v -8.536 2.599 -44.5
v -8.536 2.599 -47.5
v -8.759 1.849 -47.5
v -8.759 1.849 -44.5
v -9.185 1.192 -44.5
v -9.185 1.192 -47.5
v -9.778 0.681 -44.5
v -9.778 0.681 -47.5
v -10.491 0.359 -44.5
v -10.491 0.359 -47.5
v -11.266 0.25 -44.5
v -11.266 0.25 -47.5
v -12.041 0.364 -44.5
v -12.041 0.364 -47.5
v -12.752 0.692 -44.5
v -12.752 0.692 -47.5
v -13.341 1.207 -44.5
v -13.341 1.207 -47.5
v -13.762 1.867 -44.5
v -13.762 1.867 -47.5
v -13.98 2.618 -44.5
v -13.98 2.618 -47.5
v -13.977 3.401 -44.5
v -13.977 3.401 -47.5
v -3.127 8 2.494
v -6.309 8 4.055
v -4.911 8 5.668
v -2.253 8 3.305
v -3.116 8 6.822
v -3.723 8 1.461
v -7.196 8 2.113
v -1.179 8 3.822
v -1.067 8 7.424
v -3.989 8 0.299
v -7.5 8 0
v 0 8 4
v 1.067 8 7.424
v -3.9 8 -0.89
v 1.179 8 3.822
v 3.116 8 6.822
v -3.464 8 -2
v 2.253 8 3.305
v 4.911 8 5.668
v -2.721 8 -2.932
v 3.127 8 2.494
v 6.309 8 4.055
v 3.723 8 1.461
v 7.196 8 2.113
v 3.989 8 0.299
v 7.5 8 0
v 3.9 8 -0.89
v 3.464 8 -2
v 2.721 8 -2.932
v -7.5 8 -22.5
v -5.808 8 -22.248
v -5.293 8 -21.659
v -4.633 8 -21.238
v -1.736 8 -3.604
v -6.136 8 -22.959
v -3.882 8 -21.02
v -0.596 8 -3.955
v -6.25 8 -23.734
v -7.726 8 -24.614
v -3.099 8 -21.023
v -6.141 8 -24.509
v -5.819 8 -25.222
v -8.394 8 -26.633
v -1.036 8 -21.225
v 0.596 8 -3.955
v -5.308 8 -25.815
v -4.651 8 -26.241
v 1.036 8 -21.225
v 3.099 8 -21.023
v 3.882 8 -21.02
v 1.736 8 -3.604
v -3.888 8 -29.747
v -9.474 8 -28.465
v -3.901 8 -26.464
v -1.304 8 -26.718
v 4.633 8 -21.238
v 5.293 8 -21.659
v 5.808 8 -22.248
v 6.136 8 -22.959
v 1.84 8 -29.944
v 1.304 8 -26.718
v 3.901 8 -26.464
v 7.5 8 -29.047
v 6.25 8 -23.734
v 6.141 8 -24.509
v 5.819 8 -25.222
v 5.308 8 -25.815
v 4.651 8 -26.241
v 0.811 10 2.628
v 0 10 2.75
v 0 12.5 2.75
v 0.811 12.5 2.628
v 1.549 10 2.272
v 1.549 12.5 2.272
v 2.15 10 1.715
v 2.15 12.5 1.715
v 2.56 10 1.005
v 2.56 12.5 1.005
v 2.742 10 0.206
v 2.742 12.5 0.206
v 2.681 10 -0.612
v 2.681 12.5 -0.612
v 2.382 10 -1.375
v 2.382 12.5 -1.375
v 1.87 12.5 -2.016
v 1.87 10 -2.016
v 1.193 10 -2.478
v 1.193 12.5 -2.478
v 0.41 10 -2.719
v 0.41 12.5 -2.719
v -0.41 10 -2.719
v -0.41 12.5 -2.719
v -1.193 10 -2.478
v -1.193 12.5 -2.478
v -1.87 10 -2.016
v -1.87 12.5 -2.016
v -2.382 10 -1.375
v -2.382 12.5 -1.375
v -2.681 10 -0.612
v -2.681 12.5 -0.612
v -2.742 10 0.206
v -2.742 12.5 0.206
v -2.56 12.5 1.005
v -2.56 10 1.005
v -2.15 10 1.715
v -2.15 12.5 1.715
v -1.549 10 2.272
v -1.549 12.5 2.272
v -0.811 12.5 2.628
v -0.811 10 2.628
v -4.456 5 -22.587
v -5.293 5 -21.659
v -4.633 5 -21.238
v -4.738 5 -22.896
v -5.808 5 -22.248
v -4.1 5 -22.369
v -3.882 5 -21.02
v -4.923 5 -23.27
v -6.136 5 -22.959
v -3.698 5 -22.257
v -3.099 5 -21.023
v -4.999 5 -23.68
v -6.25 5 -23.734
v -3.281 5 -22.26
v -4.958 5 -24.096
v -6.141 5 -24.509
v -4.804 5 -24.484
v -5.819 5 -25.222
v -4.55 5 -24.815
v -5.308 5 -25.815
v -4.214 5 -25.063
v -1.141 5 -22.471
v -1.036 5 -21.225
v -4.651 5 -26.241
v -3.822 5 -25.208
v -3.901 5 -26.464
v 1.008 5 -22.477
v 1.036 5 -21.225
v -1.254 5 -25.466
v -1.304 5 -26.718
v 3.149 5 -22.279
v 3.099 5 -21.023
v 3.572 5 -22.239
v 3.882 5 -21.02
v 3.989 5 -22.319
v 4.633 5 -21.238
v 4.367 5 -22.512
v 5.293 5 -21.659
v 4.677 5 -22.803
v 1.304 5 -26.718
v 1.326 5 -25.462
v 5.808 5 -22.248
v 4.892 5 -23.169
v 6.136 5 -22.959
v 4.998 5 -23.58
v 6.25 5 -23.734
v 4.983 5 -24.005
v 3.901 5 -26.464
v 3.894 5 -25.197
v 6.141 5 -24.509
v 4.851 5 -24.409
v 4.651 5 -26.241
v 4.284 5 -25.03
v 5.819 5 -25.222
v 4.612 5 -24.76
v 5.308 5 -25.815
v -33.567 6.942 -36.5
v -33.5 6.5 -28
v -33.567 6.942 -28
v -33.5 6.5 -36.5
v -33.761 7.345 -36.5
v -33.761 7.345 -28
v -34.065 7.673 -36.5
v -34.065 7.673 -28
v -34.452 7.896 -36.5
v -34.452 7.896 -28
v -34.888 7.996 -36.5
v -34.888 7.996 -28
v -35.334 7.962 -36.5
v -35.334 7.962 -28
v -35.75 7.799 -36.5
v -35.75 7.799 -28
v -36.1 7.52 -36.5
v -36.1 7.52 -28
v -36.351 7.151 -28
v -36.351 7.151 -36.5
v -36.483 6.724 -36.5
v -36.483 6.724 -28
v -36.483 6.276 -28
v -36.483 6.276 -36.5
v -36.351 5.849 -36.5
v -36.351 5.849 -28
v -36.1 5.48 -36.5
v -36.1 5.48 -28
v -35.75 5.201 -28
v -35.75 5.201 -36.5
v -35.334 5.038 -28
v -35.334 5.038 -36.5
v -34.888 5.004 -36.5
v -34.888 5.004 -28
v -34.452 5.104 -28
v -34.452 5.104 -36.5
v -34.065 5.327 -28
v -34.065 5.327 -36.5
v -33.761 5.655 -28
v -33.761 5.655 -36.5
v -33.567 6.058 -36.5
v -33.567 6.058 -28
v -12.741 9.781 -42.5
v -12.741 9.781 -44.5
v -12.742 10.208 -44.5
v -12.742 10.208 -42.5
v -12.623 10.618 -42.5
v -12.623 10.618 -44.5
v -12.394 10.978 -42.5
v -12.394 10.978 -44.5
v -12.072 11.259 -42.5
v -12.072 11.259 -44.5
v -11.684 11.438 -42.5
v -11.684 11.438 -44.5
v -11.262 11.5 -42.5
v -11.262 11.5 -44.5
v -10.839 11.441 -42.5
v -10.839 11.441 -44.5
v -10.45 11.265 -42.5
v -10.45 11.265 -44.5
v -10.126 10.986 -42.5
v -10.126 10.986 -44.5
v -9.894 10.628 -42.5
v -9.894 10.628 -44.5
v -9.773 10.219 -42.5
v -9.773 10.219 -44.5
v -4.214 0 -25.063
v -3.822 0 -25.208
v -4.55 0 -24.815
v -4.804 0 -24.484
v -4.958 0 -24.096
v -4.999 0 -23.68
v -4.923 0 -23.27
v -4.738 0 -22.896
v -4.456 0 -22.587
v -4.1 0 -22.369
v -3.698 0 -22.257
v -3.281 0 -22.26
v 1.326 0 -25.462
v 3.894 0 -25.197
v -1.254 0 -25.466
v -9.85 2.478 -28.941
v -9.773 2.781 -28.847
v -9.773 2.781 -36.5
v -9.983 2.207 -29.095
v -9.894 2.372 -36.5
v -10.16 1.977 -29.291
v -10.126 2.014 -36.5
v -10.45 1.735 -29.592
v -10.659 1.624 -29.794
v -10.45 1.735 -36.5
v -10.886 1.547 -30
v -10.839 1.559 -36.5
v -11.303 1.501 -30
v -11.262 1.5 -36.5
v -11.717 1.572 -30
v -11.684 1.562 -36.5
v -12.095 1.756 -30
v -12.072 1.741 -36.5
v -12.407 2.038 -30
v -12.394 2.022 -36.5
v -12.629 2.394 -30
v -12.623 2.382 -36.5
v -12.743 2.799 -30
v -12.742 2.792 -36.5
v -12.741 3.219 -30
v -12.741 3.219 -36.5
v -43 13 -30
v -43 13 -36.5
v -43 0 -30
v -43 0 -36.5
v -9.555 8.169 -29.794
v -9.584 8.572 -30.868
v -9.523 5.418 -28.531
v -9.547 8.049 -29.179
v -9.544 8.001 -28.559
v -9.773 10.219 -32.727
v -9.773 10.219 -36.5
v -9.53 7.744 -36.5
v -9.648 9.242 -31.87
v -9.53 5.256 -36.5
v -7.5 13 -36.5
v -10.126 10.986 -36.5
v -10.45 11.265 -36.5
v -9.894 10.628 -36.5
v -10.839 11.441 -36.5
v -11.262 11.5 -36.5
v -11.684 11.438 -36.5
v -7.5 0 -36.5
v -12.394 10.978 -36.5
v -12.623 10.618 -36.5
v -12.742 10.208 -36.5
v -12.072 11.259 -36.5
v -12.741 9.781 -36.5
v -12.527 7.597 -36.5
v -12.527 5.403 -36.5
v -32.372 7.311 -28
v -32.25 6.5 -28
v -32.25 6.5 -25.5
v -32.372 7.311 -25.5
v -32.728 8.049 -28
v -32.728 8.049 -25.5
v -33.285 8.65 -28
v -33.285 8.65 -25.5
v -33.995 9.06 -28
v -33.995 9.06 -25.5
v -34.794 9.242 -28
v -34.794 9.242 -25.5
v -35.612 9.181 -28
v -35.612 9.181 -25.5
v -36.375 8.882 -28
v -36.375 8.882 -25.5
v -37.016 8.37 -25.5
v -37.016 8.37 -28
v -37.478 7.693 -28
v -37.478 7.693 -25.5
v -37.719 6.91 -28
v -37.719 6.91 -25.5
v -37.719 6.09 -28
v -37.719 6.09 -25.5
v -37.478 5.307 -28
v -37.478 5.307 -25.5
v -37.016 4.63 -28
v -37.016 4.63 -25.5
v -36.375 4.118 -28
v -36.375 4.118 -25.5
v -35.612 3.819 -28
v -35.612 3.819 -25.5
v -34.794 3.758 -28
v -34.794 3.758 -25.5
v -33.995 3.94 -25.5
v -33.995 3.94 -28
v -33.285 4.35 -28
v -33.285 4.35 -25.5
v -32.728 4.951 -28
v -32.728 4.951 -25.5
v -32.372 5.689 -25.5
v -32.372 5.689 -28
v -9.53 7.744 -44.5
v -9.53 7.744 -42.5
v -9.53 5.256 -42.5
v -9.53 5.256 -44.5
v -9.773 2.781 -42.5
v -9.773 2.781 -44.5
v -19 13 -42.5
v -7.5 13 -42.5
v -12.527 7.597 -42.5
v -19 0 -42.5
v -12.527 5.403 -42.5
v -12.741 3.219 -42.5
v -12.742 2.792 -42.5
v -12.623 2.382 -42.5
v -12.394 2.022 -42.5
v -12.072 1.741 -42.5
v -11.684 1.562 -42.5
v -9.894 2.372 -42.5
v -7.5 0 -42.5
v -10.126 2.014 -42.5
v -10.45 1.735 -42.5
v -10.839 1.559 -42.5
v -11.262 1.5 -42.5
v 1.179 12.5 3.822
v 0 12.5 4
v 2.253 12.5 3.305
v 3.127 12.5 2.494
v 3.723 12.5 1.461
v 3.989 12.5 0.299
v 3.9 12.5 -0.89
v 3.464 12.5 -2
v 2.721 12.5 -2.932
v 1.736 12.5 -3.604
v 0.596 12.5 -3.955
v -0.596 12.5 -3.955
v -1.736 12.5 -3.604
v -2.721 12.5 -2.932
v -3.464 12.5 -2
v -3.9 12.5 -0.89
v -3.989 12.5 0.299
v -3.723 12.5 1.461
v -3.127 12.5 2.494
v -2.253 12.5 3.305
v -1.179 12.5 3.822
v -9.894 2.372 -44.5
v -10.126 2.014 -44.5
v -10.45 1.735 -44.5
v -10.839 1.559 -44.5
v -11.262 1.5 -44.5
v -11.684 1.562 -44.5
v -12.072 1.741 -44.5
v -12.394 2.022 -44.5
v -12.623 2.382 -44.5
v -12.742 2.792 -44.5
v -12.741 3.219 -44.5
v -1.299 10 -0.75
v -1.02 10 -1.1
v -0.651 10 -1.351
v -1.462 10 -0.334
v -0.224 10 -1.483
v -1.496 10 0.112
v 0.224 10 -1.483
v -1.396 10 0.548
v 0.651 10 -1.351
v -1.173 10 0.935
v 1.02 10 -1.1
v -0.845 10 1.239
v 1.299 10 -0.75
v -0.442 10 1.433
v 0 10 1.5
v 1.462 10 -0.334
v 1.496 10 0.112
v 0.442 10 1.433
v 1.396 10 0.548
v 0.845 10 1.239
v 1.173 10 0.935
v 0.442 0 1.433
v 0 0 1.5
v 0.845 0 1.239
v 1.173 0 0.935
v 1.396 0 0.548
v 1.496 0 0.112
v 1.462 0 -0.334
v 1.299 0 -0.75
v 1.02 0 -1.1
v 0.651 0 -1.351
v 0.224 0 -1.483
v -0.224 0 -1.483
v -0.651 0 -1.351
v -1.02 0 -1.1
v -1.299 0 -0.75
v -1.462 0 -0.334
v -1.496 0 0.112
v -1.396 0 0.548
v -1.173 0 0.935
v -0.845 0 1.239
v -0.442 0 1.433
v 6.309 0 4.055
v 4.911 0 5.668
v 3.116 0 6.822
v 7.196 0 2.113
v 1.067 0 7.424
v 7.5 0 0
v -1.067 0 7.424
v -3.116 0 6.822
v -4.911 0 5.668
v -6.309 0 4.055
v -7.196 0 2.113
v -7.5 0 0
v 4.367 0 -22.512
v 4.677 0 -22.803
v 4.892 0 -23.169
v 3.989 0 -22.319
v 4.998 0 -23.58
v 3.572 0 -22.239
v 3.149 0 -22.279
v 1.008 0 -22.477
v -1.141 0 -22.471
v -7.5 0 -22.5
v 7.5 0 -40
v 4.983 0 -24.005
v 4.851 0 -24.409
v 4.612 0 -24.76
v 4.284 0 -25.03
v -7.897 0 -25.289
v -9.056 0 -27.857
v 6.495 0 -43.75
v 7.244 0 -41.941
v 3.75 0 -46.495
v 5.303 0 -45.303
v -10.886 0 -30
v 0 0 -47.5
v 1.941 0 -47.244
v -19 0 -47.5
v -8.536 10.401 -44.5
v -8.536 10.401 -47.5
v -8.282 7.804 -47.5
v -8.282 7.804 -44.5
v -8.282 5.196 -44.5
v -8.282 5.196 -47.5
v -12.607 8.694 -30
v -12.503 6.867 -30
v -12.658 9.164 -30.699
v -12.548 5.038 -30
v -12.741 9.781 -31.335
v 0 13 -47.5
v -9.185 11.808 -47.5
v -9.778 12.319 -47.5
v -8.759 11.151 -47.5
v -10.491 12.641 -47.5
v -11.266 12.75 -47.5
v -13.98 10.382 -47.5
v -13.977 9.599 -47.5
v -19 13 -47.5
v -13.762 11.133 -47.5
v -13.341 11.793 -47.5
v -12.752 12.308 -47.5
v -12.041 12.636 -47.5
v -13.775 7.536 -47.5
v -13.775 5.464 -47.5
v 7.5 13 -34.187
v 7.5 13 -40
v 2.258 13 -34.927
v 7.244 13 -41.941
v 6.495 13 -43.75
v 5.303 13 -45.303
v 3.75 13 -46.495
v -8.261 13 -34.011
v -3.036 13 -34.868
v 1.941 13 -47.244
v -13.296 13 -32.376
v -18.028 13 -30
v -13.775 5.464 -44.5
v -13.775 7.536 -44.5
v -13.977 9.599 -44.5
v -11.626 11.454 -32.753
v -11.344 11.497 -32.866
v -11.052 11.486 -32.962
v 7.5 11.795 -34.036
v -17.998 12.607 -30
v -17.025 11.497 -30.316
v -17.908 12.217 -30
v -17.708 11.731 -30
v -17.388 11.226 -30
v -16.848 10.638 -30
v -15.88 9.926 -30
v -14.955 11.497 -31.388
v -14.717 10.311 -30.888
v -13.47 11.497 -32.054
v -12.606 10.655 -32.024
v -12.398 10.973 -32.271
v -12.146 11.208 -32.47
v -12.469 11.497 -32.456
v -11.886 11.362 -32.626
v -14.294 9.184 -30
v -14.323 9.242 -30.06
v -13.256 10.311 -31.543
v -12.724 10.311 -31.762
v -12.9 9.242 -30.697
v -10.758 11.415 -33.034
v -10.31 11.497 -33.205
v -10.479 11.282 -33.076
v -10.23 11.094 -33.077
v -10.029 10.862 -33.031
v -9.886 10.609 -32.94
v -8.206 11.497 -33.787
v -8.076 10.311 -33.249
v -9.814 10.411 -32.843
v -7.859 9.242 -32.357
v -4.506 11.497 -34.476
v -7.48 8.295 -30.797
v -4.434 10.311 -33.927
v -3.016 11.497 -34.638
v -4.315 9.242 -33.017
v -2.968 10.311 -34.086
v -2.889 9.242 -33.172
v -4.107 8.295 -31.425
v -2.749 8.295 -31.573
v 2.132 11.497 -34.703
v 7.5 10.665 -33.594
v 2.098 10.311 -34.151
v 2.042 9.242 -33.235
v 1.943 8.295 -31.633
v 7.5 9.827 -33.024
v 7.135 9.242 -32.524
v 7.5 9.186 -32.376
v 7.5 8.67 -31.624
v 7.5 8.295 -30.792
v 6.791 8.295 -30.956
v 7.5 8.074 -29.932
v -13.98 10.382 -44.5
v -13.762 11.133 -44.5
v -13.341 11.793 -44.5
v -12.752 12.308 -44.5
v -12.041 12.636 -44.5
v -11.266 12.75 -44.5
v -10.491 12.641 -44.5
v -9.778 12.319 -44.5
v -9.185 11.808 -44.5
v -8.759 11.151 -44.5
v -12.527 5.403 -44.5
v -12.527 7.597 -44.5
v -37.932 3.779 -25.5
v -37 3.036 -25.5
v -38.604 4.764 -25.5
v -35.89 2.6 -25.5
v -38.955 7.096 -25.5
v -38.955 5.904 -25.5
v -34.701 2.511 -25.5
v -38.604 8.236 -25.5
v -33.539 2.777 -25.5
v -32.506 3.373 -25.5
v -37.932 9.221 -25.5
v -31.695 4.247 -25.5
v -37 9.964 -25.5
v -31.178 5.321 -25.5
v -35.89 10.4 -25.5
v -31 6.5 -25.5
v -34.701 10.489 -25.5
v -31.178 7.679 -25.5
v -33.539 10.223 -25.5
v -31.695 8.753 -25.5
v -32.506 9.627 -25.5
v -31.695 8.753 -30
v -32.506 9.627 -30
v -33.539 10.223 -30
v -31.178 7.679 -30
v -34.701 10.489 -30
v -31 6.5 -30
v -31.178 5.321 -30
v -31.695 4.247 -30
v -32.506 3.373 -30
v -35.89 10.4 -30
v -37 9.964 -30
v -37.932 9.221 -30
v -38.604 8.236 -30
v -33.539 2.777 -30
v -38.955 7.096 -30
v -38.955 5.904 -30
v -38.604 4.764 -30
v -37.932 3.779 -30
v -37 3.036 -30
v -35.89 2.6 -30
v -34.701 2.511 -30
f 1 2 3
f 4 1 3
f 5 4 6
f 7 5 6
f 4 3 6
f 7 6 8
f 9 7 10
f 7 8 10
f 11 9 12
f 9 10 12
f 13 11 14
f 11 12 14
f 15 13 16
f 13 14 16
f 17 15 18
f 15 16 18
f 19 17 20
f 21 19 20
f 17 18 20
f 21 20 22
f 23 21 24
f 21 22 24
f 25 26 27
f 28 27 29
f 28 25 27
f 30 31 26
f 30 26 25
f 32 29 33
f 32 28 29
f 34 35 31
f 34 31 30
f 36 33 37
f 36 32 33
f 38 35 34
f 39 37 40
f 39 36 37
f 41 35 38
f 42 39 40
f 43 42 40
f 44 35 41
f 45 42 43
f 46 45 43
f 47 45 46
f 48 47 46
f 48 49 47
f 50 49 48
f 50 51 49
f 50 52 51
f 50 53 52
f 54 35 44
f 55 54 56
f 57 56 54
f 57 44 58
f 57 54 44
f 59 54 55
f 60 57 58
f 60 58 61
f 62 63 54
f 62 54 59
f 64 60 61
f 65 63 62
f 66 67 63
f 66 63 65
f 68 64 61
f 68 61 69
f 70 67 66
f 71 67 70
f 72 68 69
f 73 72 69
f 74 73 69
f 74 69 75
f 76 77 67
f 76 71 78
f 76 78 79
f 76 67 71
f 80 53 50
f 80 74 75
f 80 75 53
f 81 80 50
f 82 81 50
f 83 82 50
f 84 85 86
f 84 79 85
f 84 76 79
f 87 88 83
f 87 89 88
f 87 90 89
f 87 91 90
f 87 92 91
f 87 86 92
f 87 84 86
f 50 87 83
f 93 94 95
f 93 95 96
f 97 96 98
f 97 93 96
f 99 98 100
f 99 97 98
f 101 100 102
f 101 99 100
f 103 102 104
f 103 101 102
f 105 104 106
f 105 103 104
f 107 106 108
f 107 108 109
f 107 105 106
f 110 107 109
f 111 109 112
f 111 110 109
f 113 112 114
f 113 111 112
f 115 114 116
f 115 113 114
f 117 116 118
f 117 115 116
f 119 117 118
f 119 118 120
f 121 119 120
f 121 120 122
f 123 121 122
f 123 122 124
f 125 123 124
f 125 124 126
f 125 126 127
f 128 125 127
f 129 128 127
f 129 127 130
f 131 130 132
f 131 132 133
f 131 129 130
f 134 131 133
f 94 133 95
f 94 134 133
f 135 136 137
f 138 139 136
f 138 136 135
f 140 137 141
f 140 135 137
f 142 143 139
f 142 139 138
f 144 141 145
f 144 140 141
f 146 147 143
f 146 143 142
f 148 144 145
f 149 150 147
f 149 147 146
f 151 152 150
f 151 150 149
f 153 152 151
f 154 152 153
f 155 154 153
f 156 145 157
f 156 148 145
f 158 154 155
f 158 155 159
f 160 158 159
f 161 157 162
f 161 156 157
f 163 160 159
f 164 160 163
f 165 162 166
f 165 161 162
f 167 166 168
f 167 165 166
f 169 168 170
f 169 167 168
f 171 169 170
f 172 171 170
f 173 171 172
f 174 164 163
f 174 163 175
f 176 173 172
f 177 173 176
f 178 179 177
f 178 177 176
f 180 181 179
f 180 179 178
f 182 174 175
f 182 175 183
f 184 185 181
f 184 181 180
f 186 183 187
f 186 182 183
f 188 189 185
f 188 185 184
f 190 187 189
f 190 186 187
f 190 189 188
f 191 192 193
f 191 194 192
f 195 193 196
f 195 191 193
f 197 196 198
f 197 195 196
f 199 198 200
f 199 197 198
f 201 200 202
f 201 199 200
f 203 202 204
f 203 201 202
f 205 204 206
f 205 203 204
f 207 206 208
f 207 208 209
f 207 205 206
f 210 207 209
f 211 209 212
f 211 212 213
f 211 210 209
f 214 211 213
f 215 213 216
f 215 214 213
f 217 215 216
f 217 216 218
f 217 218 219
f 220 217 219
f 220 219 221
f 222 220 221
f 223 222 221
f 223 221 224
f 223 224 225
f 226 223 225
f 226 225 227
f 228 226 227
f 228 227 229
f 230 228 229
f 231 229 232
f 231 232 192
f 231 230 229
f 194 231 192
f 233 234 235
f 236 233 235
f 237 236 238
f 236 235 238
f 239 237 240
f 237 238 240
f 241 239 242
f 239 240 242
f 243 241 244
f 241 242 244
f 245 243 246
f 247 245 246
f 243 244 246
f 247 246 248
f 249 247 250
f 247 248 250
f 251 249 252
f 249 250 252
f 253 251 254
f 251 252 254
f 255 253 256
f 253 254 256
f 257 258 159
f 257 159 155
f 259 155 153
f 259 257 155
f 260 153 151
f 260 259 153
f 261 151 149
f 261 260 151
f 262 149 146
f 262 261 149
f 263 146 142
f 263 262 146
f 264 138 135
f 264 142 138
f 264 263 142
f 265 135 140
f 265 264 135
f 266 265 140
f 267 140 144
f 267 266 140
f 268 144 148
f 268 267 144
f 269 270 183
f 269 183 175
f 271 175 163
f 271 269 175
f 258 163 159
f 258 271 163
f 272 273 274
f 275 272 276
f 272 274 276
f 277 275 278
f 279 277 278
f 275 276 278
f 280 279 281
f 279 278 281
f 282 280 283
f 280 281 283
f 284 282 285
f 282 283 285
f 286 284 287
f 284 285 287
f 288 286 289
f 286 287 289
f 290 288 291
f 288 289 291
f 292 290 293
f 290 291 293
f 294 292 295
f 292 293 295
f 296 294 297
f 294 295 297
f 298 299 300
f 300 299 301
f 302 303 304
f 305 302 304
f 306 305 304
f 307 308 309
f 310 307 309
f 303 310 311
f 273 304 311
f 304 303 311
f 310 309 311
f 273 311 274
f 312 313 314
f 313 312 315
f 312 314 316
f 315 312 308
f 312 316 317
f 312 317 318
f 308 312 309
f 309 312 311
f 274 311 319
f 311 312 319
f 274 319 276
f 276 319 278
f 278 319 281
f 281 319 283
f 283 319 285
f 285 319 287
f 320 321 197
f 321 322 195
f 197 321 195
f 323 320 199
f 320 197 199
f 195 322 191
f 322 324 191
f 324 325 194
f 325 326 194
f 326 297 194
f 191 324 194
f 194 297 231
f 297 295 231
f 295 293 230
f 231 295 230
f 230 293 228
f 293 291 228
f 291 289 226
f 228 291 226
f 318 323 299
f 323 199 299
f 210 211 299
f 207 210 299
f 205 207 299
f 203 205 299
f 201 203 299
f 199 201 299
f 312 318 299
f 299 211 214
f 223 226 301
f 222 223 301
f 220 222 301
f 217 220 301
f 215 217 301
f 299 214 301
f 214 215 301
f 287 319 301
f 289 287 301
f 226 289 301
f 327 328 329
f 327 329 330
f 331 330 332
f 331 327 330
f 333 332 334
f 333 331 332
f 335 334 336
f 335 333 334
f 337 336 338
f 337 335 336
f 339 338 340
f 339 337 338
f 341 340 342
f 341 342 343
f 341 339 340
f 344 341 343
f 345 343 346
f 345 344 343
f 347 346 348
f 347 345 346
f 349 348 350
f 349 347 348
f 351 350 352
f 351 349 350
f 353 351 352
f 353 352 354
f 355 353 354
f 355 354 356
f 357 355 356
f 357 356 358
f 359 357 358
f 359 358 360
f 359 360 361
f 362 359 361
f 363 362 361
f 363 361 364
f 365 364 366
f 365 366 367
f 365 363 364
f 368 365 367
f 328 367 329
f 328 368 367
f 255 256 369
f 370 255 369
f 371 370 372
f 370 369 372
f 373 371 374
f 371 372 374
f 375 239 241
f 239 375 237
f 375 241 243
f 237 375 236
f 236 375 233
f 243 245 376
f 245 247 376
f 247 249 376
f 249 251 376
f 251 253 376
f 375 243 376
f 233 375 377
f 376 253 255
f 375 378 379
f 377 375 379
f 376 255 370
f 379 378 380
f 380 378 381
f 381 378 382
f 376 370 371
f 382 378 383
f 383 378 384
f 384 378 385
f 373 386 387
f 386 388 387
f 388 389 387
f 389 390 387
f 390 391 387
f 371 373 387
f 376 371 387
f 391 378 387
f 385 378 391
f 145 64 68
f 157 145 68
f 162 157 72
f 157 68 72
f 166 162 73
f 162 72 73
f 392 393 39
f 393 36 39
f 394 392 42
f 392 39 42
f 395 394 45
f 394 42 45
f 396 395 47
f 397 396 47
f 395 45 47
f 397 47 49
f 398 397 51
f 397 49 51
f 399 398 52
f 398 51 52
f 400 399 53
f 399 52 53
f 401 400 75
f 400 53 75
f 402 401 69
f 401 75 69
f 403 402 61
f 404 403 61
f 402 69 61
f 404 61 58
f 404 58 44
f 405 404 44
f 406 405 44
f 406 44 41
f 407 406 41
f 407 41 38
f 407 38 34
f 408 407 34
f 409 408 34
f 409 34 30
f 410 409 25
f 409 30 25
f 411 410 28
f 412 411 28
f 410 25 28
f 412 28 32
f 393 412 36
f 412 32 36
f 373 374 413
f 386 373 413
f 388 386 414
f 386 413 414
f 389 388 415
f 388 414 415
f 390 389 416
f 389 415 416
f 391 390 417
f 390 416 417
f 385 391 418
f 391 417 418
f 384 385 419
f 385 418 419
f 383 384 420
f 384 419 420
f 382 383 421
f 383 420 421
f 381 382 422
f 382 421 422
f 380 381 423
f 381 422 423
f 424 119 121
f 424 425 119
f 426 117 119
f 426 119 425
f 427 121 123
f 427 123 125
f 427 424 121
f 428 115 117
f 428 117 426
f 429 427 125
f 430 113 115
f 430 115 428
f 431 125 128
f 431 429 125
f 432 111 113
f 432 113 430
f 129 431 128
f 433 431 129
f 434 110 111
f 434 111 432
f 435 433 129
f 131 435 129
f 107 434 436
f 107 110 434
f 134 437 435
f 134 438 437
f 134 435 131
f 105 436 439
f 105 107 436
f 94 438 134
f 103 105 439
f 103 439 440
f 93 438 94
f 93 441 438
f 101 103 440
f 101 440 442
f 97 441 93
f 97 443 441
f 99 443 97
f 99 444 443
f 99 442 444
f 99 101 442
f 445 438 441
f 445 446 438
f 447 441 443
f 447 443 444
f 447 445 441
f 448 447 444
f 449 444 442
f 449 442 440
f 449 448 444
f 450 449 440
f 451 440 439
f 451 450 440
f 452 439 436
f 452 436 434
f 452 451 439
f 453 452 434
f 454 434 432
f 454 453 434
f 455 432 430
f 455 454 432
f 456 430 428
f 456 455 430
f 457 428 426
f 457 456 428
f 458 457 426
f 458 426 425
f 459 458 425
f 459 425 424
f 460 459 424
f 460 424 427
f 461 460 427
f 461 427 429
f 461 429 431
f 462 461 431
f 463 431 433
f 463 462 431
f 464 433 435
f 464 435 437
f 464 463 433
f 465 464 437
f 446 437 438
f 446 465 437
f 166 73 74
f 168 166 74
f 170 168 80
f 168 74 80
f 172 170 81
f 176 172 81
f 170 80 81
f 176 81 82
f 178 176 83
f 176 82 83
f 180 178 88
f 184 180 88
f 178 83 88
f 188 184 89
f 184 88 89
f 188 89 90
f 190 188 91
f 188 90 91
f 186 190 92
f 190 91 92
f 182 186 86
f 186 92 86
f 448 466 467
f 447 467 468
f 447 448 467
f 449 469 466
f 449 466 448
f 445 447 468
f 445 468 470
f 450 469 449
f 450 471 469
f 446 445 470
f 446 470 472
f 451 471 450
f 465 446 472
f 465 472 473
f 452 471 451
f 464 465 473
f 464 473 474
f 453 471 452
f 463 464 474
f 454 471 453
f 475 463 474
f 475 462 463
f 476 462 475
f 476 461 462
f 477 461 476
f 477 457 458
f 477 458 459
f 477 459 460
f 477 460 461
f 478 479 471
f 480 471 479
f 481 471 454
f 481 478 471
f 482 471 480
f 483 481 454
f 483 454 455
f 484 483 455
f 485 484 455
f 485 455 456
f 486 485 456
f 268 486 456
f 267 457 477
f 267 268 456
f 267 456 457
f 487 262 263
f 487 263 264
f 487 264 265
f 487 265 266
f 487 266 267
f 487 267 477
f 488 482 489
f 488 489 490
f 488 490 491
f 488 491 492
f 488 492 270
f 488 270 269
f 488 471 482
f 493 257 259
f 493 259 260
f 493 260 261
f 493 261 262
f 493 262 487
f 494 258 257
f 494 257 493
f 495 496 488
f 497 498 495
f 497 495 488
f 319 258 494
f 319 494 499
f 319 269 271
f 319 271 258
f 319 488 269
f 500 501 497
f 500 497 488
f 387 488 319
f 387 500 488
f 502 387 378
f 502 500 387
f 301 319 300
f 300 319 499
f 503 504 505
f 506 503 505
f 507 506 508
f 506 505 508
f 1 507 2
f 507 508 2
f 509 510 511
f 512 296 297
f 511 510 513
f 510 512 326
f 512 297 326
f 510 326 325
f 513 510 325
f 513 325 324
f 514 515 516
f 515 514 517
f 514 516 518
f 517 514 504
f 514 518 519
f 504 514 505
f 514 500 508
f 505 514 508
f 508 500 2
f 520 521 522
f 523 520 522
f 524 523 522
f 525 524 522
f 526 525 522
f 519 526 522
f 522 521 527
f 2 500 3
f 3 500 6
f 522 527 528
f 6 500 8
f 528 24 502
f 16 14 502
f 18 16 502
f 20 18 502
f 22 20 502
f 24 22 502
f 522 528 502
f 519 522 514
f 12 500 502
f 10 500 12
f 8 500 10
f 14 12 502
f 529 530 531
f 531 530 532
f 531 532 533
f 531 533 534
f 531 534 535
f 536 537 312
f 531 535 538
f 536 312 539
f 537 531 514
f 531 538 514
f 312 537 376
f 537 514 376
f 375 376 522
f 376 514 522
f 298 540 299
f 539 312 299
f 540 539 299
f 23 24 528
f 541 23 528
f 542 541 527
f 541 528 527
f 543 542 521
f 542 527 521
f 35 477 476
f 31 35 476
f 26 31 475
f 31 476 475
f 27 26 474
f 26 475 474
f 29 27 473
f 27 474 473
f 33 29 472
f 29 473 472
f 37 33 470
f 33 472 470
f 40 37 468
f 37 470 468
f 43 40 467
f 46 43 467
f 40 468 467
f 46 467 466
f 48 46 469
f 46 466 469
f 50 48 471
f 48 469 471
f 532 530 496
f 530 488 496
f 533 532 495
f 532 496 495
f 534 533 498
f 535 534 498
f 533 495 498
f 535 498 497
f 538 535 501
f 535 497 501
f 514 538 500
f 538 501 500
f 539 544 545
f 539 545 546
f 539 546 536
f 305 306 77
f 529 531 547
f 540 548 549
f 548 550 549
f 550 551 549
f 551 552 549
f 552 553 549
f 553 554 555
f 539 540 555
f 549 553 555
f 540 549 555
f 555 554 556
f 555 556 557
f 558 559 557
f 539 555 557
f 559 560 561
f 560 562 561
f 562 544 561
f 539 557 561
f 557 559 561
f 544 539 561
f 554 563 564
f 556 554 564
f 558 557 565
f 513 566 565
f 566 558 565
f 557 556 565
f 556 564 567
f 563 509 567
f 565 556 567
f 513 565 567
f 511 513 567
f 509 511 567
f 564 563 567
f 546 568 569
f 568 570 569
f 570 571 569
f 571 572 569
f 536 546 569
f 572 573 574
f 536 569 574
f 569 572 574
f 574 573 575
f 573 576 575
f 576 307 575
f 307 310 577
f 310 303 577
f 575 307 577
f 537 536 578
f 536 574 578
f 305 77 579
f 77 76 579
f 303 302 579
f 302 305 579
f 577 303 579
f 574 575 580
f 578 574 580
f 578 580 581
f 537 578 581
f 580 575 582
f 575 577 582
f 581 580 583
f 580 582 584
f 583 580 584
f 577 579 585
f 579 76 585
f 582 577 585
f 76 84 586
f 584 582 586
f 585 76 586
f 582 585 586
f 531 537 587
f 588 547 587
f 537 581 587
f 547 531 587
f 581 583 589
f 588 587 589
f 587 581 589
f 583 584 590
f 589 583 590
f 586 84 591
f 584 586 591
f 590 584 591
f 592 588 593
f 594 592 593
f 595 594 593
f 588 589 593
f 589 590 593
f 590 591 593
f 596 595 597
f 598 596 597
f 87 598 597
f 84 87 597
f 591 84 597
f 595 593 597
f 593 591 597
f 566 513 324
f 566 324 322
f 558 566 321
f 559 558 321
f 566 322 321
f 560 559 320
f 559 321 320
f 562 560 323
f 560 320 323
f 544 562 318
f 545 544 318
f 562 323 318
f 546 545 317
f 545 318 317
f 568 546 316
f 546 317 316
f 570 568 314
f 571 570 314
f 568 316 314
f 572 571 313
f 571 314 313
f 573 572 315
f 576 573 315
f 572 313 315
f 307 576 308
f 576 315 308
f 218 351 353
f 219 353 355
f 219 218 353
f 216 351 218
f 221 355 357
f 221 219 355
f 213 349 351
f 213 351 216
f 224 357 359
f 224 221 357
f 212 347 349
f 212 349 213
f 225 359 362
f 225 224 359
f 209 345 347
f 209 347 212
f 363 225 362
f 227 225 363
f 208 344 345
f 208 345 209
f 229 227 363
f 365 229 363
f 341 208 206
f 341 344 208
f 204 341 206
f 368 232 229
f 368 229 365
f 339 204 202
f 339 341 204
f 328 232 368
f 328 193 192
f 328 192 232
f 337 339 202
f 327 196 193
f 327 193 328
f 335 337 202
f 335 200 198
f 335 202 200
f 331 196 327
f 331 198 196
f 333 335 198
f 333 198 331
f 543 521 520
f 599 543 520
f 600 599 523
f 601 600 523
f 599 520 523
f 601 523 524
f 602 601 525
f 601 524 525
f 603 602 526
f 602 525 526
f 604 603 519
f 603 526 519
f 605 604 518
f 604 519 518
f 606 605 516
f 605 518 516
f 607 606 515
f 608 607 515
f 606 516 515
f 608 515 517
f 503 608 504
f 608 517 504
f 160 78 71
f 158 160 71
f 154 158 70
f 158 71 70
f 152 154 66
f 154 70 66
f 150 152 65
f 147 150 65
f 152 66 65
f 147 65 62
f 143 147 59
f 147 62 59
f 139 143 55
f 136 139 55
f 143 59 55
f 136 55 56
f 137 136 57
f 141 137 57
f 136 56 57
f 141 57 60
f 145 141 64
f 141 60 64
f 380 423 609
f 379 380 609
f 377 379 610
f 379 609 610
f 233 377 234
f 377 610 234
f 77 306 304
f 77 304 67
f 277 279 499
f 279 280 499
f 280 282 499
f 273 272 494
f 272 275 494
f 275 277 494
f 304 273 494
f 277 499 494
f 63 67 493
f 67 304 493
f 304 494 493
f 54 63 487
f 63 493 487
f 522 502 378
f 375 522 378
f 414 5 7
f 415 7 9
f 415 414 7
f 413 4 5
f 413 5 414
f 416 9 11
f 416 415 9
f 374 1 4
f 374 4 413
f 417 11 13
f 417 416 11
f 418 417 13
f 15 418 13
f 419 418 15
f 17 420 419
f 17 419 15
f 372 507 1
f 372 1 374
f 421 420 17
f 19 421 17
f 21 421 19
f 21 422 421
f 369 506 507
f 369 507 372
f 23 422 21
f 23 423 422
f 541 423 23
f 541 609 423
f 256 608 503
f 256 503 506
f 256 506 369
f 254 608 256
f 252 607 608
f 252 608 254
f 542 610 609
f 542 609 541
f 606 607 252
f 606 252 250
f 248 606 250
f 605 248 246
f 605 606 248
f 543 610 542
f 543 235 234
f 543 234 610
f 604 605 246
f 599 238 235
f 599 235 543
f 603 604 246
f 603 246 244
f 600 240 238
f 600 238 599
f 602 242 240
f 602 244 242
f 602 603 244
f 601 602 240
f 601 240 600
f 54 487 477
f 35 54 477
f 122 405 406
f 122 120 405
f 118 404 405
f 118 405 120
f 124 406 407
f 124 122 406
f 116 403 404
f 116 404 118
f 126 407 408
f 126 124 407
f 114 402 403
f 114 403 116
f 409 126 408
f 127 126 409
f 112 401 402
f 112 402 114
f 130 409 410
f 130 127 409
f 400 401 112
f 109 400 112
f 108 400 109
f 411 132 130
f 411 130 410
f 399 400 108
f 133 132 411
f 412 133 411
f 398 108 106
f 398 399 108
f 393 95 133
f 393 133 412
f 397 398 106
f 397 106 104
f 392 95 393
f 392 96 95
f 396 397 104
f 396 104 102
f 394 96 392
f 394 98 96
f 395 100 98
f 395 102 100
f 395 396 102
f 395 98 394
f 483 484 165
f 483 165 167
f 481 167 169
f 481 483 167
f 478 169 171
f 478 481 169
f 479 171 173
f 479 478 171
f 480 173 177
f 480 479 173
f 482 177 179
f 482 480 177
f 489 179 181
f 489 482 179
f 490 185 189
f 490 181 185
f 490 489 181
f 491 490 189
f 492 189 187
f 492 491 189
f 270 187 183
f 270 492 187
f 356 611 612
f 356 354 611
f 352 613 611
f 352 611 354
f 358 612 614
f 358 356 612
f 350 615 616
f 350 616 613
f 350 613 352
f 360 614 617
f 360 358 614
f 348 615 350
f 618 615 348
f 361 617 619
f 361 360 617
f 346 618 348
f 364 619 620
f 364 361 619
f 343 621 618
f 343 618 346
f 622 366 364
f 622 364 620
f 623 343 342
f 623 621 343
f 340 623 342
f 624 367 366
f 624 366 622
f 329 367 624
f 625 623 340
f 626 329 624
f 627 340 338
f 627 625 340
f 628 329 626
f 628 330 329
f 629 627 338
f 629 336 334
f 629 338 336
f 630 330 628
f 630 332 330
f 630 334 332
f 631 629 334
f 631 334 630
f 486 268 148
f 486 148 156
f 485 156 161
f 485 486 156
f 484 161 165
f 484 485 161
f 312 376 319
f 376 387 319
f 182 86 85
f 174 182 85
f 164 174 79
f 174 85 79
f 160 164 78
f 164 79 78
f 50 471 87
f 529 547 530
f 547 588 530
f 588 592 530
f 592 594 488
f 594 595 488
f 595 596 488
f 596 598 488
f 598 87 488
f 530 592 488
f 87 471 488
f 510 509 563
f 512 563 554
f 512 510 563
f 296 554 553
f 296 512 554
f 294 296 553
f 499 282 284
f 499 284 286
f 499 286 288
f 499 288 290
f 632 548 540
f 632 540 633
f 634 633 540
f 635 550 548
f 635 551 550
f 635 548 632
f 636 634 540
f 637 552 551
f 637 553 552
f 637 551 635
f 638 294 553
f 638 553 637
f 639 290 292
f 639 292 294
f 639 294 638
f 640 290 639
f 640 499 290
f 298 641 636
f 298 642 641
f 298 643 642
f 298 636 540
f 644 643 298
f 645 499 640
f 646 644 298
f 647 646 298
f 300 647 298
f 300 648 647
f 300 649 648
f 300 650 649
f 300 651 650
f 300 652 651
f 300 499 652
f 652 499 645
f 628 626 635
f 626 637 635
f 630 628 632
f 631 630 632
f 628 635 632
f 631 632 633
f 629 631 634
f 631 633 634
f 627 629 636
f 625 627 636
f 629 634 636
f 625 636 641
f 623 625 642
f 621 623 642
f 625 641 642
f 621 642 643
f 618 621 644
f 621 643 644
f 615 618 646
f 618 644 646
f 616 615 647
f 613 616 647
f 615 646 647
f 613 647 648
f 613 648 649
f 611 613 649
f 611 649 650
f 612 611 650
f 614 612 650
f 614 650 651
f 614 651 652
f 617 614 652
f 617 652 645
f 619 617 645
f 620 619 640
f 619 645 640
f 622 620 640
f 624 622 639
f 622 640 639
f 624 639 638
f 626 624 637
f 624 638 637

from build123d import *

# Parameters (mm, degrees)
SKETCH1_R           = 1.5
BOSS_EXTRUDE1_DEPTH = 8
SKETCH2_R           = 4
SKETCH2_R_2         = 1.5
BOSS_EXTRUDE2_DEPTH = 2
SKETCH4_R           = 4
SKETCH4_R_2         = 2.75
BOSS_EXTRUDE3_DEPTH = 2.5
CUT_EXTRUDE1_DEPTH  = 3
BOSS_EXTRUDE4_DEPTH = 5
BOSS_EXTRUDE5_DEPTH = 2.5
BOSS_EXTRUDE6_DEPTH = 13
BOSS_EXTRUDE7_DEPTH = 8
CUT_EXTRUDE4_START  = -5
SKETCH16_R          = 35.00000000000001
SKETCH16_R_2        = 33.50186054017001
CUT_EXTRUDE4_DEPTH  = 5
FILLET2_R           = 5
SKETCH6_R           = 1.500000000000004
CUT_EXTRUDE5_DEPTH  = 72.01408318918156
SKETCH6_8_R         = 1.500000000000004
CUT_EXTRUDE6_DEPTH  = 3
SKETCH17_R          = 3.999999999999999
SKETCH17_R_2        = 1.500000000000004
BOSS_EXTRUDE8_DEPTH = 2
SKETCH18_R          = 4.000000000000003
SKETCH18_R_2        = 2.7500000000000018
BOSS_EXTRUDE9_DEPTH = 2.5


with BuildPart() as part:
    # Sketch1 → Boss-Extrude1 (new body)
    with BuildSketch(Plane(origin=(0, 0, 0), x_dir=(1, 0, 0), z_dir=(0, 1, 0))):
        with BuildLine():
            Line((-7.5, 36.50000000000001), (-43, 36.5))
            Line((-43, 36.5), (-43, 32.5))
            Line((-43, 32.5), (-17.500000000000068, 32.49999999999999))
            ThreePointArc((-17.500000000000068, 32.49999999999999), (-10.428932188134521, 29.571067811865472), (-7.499999999999997, 22.499999999999922))
            Line((-7.499999999999997, 22.499999999999922), (-7.5, 0))
            ThreePointArc((-7.5, 0), (-1.38e-15, -7.5), (7.5, 0))
            Line((7.5, 0), (7.5, 40))
            ThreePointArc((7.5, 40), (5.303300858899107, 45.30330085889911), (1.7e-16, 47.5))
            Line((1.7e-16, 47.5), (-19, 47.5))
            Line((-19, 47.5), (-19, 42.5))
            Line((-19, 42.5), (-7.5, 42.5))
            Line((-7.5, 42.5), (-7.5, 36.50000000000001))
        make_face()
        with Locations(Location((0, 0, 0), (0, 0, 270))):
            Circle(SKETCH1_R, mode=Mode.SUBTRACT)
        with BuildLine():
            ThreePointArc((-3.822328563123411, 25.208378945159915), (-4.975312131849936, 23.47239594738329), (-3.2806101420555054, 22.2595508442844))
            ThreePointArc((-3.2806101420555054, 22.2595508442844), (-0.0667184196164731, 22.499901229693076), (3.1485421826830366, 22.278615056087435))
            ThreePointArc((3.1485421826830366, 22.278615056087435), (4.959579589511544, 23.370856111085427), (3.8935926199376825, 25.19747013486111))
            ThreePointArc((3.8935926199376825, 25.19747013486111), (0.03604708010283943, 25.496495157085157), (-3.822328563123411, 25.208378945159915))
        make_face(mode=Mode.SUBTRACT)
    extrude(amount=BOSS_EXTRUDE1_DEPTH)

    # Sketch2 → Boss-Extrude2 (add)
    with BuildSketch(Plane(origin=(0, 8, 0), x_dir=(1, 0, 0), z_dir=(0, 1, 0))):
        with Locations(Location((0, 0, 0), (0, 0, 270))):
            Circle(SKETCH2_R)
        with Locations(Location((0, 0, 0), (0, 0, 270))):
            Circle(SKETCH2_R_2, mode=Mode.SUBTRACT)
    extrude(amount=BOSS_EXTRUDE2_DEPTH)

    # Sketch4 → Boss-Extrude3 (add)
    with BuildSketch(Plane(origin=(0, 10, 0), x_dir=(1, 0, 0), z_dir=(0, 1, 0))):
        with Locations(Location((0, 0, 0), (0, 0, 270))):
            Circle(SKETCH4_R)
        with Locations(Location((0, 0, 0), (0, 0, 270))):
            Circle(SKETCH4_R_2, mode=Mode.SUBTRACT)
    extrude(amount=BOSS_EXTRUDE3_DEPTH)

    # Sketch5 → Cut-Extrude1 (cut)
    with BuildSketch(Plane(origin=(0, 8, 0), x_dir=(1, 0, 0), z_dir=(0, 1, 0))):
        with BuildLine():
            ThreePointArc((-3.901041666666667, 26.46402036567631), (-6.220600224508779, 23.342378474500862), (-3.098958333333334, 21.022819916658754))
            ThreePointArc((-3.098958333333334, 21.022819916658754), (1.3e-15, 21.250000000000004), (3.098958333333334, 21.022819916658754))
            ThreePointArc((3.098958333333334, 21.022819916658754), (6.220600224508775, 23.342378474500865), (3.901041666666667, 26.46402036567631))
            ThreePointArc((3.901041666666667, 26.46402036567631), (1.64e-15, 26.749999999999996), (-3.901041666666667, 26.46402036567631))
        make_face()
    extrude(amount=-CUT_EXTRUDE1_DEPTH, mode=Mode.SUBTRACT)

    # Sketch11 → Boss-Extrude4 (add)
    with BuildSketch(Plane(origin=(0, 8, 0), x_dir=(1, 0, 0), z_dir=(0, 1, 0))):
        with BuildLine():
            Line((-19, 42.5), (-7.5, 42.5))
            Line((-7.5, 42.5), (-7.5, 36.50000000000001))
            Line((-7.5, 36.50000000000001), (-43, 36.5))
            Line((-43, 36.5), (-43, 32.5))
            Line((-43, 32.5), (-17.500000000000064, 32.49999999999999))
            ThreePointArc((-17.500000000000064, 32.49999999999999), (-15.859503936382302, 32.36452090398995), (-14.263458457505935, 31.961754533050943))
            ThreePointArc((-14.263458457505937, 31.961754533050936), (-3.5600570438609966, 34.81847202053036), (7.5, 34.18698582794336))
            Line((7.5, 34.18698582794336), (7.5, 40))
            ThreePointArc((7.5, 40), (5.303300858899107, 45.30330085889911), (1.3e-16, 47.5))
            Line((9.2e-16, 47.5), (-19, 47.5))
            Line((-19, 47.5), (-19, 42.5))
        make_face()
    extrude(amount=BOSS_EXTRUDE4_DEPTH)

    # Sketch12 → Boss-Extrude5 (add)
    with BuildSketch(Plane.XY.offset(-32.499999999999986)):
        Polygon((-43.00000000000001, 0), (-17.500000000000078, 0), (-17.500000000000085, 13.000000000000002), (-43.00000000000001, 13.000000000000002), align=None)
    extrude(amount=BOSS_EXTRUDE5_DEPTH)

    # Sketch14 → Boss-Extrude6 (add)
    with BuildSketch(Plane(origin=(0, 0, 0), x_dir=(1, 0, 0), z_dir=(0, 1, 0))):
        with BuildLine():
            Line((-17.500000000000068, 30.310889132455326), (-17.500000000000075, 32.49999999999999))
            ThreePointArc((-17.500000000000075, 32.49999999999999), (-15.859503936382307, 32.364520903989956), (-14.263458457505932, 31.961754533050946))
            ThreePointArc((-14.263458457505932, 31.961754533050946), (-15.903165170435354, 31.178347255136085), (-17.500000000000068, 30.310889132455326))
        make_face()
    extrude(amount=BOSS_EXTRUDE6_DEPTH)

    # Sketch15 → Boss-Extrude7 (add)
    with BuildSketch(Plane(origin=(0, 0, 0), x_dir=(1, 0, 0), z_dir=(0, 1, 0))):
        with BuildLine():
            Line((-17.500000000000075, 29.99999999999999), (-17.500000000000068, 30.310889132455326))
            ThreePointArc((-17.500000000000068, 30.310889132455326), (-15.90316517043534, 31.178347255136092), (-14.263458457505916, 31.961754533050954))
            ThreePointArc((-14.263458457505916, 31.961754533050954), (-12.477821634213894, 31.14741143130302), (-10.8856217223385, 29.99999999999999))
            Line((-10.8856217223385, 29.99999999999999), (-17.500000000000075, 29.99999999999999))
        make_face()
    extrude(amount=BOSS_EXTRUDE7_DEPTH)

    # Sketch16 → Cut-Extrude4 (cut)
    with BuildSketch(Plane(origin=(0, 13.000000000000002, 0), x_dir=(1, 0, 0), z_dir=(0, 1, 0)).offset(CUT_EXTRUDE4_START)):
        Circle(SKETCH16_R)
        Circle(SKETCH16_R_2, mode=Mode.SUBTRACT)
    extrude(amount=CUT_EXTRUDE4_DEPTH, mode=Mode.SUBTRACT)

    # Fillet2
    fillet2_edges = [part.edges().sort_by_distance(p)[0] for p in [
        (-5.664903014694951, 8, -34.5385129071027),
    ]]
    fillet(fillet2_edges, radius=FILLET2_R - 0.0001)  # a hair under: the kernel refuses the full size

    # Sketch6 → Cut-Extrude5 (cut, through all)
    with BuildSketch(Plane(origin=(0, 0, -47.5), x_dir=(-1, 0, 0), z_dir=(0, 0, -1))):
        with BuildLine():
            ThreePointArc((12.740543617655444, 9.78125), (11.475329858832474, 11.483963758822968), (9.772616100009506, 10.21875))
            ThreePointArc((9.772616100009506, 10.21875), (9.50000000000001, 6.5000000000000036), (9.772616100009508, 2.7812499999999982))
            ThreePointArc((9.772616100009508, 2.7812499999999982), (11.475329858832469, 1.5160362411770363), (12.740543617655444, 3.218749999999997))
            ThreePointArc((12.740543617655444, 3.218749999999997), (12.500000000000004, 6.500000000000003), (12.740543617655444, 9.78125))
        make_face()
        with Locations(Location((35, 6.5, 0), (0, 0, 180))):
            Circle(SKETCH6_R)
    extrude(amount=-CUT_EXTRUDE5_DEPTH, mode=Mode.SUBTRACT)

    # Sketch6<8> → Cut-Extrude6 (cut)
    # profile 1 of 2: a face of its own
    with BuildSketch(Plane(origin=(0, 0, -47.5), x_dir=(-1, 0, 0), z_dir=(0, 0, -1))):
        with Locations(Location((35, 6.5, 0), (0, 0, 180))):
            Circle(SKETCH6_8_R)
    # profile 2 of 2: a face of its own
    with BuildSketch(Plane(origin=(0, 0, -47.5), x_dir=(-1, 0, 0), z_dir=(0, 0, -1))):
        with BuildLine():
            ThreePointArc((13.977180083341253, 9.598958333333332), (11.65762152549914, 12.720600224508777), (8.535979634323695, 10.401041666666664))
            ThreePointArc((8.535979634323695, 10.401041666666664), (8.250000000000007, 6.5000000000000036), (8.535979634323692, 2.5989583333333335))
            ThreePointArc((8.535979634323692, 2.5989583333333335), (11.657621525499136, 0.27939977549122075), (13.97718008334125, 3.401041666666666))
            ThreePointArc((13.97718008334125, 3.401041666666666), (13.750000000000004, 6.500000000000003), (13.977180083341253, 9.598958333333332))
        make_face()
        with BuildLine():
            ThreePointArc((12.740543617655444, 9.78125), (11.475329858832474, 11.483963758822968), (9.772616100009506, 10.21875))
            ThreePointArc((9.772616100009506, 10.21875), (9.50000000000001, 6.5000000000000036), (9.772616100009508, 2.7812499999999982))
            ThreePointArc((9.772616100009508, 2.7812499999999982), (11.475329858832469, 1.5160362411770363), (12.740543617655444, 3.218749999999997))
            ThreePointArc((12.740543617655444, 3.218749999999997), (12.500000000000004, 6.500000000000003), (12.740543617655444, 9.78125))
        make_face(mode=Mode.SUBTRACT)
    extrude(amount=-CUT_EXTRUDE6_DEPTH, mode=Mode.SUBTRACT)

    # Sketch17 → Boss-Extrude8 (add)
    with BuildSketch(Plane.XY.offset(-29.99999999999999)):
        with Locations((-35, 6.5)):
            Circle(SKETCH17_R)
        with Locations((-35, 6.5)):
            Circle(SKETCH17_R_2, mode=Mode.SUBTRACT)
    extrude(amount=BOSS_EXTRUDE8_DEPTH)

    # Sketch18 → Boss-Extrude9 (add)
    with BuildSketch(Plane.XY.offset(-27.99999999999999)):
        with Locations((-35, 6.5)):
            Circle(SKETCH18_R)
        with Locations((-35, 6.5)):
            Circle(SKETCH18_R_2, mode=Mode.SUBTRACT)
    extrude(amount=BOSS_EXTRUDE9_DEPTH)


solid = part.part
